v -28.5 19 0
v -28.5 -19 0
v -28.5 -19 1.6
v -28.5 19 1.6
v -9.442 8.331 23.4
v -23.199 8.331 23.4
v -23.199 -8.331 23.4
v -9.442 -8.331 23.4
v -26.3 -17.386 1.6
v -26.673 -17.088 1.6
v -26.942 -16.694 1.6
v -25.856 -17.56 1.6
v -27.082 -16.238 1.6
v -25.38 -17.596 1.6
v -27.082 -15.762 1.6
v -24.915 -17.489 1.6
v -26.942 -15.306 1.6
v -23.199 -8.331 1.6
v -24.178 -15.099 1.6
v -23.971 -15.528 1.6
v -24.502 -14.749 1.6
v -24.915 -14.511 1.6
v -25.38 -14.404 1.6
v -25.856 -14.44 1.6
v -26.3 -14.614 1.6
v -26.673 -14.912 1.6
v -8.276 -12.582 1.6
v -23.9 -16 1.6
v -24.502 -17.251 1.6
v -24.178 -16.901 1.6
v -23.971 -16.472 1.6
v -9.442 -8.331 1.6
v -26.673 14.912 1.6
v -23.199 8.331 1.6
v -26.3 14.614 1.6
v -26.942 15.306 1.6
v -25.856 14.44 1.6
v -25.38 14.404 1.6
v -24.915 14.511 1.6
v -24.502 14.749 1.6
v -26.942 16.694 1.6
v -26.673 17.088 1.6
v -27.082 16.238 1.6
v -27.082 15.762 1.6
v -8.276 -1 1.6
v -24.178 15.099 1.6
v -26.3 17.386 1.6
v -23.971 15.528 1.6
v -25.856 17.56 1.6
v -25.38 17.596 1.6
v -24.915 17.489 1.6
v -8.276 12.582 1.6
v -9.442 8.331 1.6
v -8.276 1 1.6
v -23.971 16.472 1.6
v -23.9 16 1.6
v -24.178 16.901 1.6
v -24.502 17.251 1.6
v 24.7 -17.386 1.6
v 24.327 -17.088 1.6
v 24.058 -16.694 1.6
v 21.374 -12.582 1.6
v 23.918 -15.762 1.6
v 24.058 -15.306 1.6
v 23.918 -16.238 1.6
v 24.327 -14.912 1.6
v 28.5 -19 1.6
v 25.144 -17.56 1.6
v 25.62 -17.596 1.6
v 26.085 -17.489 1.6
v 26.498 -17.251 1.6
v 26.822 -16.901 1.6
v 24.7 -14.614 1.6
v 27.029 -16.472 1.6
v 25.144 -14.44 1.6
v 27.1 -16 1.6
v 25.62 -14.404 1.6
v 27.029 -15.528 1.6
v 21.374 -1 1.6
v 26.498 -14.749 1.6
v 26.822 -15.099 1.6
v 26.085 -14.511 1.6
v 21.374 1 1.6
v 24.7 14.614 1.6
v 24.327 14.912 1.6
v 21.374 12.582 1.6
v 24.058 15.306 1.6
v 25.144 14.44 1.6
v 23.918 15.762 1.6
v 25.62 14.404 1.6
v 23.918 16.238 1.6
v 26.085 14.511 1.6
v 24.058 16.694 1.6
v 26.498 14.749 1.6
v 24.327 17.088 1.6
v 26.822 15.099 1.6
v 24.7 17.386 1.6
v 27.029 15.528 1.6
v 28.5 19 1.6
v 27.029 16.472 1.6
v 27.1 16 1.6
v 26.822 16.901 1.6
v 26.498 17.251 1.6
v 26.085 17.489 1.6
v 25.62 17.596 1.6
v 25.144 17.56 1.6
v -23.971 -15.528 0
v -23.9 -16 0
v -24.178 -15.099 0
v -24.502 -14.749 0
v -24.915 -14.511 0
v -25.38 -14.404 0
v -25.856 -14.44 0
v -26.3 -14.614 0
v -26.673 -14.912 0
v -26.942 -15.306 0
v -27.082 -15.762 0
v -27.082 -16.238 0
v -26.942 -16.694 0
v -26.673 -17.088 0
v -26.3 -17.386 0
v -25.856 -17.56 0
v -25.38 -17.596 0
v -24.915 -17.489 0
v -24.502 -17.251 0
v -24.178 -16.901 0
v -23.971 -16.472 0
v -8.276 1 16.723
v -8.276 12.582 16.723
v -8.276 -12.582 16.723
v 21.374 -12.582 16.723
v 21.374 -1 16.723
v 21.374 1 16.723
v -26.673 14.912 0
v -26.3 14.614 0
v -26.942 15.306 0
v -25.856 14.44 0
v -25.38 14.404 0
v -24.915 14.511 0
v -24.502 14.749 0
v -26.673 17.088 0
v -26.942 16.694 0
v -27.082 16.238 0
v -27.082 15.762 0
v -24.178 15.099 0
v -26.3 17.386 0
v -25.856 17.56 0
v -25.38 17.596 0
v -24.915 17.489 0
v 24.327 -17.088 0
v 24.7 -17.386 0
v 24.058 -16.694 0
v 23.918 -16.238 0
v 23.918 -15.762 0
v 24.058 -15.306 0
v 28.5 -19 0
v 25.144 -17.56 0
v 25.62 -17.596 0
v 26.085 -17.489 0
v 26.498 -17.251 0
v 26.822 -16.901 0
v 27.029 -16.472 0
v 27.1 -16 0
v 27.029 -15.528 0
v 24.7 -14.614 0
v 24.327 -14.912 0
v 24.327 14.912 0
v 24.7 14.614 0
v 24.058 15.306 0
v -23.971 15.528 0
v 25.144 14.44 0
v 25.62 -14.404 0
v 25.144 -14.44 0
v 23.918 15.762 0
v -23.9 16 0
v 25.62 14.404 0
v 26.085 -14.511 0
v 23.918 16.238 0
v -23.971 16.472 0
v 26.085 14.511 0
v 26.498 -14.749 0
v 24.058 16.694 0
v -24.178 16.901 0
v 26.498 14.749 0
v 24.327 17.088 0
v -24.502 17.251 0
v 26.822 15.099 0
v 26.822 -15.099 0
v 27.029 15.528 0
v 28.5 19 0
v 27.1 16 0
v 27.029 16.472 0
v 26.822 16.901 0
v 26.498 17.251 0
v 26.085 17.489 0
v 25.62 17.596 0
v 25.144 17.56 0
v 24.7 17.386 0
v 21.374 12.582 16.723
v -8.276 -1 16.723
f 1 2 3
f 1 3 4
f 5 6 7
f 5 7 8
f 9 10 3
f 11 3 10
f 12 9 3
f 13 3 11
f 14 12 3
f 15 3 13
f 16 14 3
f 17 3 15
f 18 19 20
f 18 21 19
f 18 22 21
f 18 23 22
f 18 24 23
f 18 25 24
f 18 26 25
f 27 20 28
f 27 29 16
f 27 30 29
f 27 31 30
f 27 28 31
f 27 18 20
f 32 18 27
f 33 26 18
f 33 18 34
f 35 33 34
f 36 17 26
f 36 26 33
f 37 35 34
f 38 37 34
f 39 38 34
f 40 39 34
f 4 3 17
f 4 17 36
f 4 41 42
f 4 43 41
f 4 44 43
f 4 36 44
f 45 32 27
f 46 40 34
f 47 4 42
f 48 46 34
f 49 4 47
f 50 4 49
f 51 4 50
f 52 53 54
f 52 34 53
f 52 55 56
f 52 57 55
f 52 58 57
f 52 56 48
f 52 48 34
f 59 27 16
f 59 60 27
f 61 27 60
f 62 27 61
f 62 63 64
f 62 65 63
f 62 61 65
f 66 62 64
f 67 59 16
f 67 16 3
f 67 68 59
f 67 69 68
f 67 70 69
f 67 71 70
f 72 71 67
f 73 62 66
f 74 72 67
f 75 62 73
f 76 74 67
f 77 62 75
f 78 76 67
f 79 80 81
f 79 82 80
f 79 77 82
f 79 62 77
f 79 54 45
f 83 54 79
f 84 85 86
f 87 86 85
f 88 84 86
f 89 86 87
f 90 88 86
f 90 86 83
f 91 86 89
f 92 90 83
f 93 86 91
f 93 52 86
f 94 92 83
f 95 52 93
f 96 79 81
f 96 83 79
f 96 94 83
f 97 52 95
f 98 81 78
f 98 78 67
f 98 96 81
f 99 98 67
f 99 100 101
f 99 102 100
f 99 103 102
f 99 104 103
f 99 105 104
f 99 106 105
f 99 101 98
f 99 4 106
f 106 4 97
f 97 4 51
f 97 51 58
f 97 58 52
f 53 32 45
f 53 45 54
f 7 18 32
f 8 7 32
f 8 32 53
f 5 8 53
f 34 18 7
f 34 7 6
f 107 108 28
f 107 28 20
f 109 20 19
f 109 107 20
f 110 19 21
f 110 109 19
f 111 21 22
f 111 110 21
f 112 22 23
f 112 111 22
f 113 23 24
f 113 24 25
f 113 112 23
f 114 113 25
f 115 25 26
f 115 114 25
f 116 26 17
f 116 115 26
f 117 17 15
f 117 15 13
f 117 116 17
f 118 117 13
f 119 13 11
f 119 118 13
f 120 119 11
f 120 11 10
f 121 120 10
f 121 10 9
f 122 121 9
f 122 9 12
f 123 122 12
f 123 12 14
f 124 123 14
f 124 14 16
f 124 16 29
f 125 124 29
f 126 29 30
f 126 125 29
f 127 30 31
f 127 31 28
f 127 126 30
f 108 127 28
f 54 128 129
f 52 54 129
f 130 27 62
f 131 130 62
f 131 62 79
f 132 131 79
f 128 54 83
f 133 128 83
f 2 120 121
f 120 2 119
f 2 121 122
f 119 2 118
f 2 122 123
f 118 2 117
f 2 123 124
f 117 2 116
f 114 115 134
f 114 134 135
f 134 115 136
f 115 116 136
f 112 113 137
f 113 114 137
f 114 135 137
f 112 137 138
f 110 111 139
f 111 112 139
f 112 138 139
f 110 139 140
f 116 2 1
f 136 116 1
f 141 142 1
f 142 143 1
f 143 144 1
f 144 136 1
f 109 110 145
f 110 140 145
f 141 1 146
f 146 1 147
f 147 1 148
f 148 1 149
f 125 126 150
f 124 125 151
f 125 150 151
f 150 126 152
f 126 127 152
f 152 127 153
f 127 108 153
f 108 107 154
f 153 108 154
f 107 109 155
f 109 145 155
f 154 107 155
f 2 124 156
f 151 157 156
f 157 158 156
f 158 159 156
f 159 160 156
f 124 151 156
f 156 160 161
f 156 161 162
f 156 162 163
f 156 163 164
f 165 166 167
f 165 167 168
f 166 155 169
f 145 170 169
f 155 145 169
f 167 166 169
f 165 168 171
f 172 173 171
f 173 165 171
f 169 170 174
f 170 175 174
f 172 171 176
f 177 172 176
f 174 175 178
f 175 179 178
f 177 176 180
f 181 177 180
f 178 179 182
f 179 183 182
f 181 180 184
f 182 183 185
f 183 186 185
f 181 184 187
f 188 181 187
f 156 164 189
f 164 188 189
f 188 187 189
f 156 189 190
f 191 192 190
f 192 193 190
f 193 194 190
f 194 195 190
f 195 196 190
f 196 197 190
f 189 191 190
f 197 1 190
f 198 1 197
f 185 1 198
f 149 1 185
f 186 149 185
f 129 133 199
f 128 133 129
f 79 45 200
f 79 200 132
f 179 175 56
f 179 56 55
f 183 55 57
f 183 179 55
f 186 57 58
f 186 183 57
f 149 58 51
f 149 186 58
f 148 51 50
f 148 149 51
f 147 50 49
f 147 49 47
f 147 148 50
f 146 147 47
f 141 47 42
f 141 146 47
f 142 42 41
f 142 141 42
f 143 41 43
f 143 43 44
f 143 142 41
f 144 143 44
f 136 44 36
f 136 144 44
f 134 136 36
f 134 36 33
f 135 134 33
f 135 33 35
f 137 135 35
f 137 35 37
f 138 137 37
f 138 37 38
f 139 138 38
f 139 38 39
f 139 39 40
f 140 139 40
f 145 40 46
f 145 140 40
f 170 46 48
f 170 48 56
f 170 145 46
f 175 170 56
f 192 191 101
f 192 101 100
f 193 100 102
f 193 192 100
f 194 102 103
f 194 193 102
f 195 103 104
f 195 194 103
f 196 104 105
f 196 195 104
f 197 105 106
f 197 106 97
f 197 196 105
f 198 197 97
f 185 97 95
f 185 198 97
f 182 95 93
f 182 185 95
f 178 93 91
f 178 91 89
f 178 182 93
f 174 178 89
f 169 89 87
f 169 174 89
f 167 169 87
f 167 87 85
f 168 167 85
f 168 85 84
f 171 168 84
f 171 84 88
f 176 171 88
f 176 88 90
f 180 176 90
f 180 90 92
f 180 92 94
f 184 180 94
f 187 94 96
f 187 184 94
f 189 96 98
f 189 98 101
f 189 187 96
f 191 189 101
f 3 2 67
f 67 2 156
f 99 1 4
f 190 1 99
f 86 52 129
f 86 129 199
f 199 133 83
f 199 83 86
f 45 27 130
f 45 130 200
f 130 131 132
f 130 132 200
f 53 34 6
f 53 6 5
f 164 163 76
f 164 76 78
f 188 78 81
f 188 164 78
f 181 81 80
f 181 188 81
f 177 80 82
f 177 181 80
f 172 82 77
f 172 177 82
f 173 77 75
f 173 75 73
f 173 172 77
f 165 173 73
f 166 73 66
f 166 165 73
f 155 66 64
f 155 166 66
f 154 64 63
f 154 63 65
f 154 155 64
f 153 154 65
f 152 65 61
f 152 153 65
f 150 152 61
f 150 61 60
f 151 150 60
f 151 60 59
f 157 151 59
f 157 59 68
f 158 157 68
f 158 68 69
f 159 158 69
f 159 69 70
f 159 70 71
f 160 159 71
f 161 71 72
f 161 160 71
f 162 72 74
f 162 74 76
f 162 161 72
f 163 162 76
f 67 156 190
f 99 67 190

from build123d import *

# Parameters (mm, degrees)
SKETCH1_W           = 57
SKETCH1_H           = 38
SKETCH1_R           = 1.6
BOSS_EXTRUDE1_DEPTH = 1.6
SKETCH2_W           = 13.757535131
SKETCH2_H           = 16.66221661
SKETCH2_W_2         = 29.650373418
SKETCH2_H_2         = 11.582071503
BOSS_EXTRUDE2_DEPTH = 21.8
SKETCH3_W           = 29.650373418
SKETCH3_H           = 6.677072175
CUT_EXTRUDE1_DEPTH  = 49.551387626


with BuildPart() as part:
    # Sketch1 → Boss-Extrude1 (new body)
    with BuildSketch(Plane.XY):
        Rectangle(SKETCH1_W, SKETCH1_H)
        with Locations((-25.5, 16)):
            Circle(SKETCH1_R, mode=Mode.SUBTRACT)
        with Locations((-25.5, -16)):
            Circle(SKETCH1_R, mode=Mode.SUBTRACT)
        with Locations((25.5, -16)):
            Circle(SKETCH1_R, mode=Mode.SUBTRACT)
        with Locations((25.5, 16)):
            Circle(SKETCH1_R, mode=Mode.SUBTRACT)
    extrude(amount=BOSS_EXTRUDE1_DEPTH)

    # Sketch2 → Boss-Extrude2 (add)
    with BuildSketch(Plane.XY.offset(1.6)):
        with Locations((-16.320596847, 0)):
            Rectangle(SKETCH2_W, SKETCH2_H)
        with Locations((6.548865085, 6.791035752)):
            Rectangle(SKETCH2_W_2, SKETCH2_H_2)
        with Locations((6.548865085, -6.791035752)):
            Rectangle(SKETCH2_W_2, SKETCH2_H_2)
    extrude(amount=BOSS_EXTRUDE2_DEPTH)

    # Sketch3 → Cut-Extrude1 (cut, through all)
    with BuildSketch(Plane(origin=(0, -12.582071503, 0), x_dir=(-1, 0, 0), z_dir=(0, -1, 0))):
        with Locations((-6.548865085, -20.061463913)):
            Rectangle(SKETCH3_W, SKETCH3_H)
    extrude(amount=-CUT_EXTRUDE1_DEPTH, mode=Mode.SUBTRACT)


solid = part.part
